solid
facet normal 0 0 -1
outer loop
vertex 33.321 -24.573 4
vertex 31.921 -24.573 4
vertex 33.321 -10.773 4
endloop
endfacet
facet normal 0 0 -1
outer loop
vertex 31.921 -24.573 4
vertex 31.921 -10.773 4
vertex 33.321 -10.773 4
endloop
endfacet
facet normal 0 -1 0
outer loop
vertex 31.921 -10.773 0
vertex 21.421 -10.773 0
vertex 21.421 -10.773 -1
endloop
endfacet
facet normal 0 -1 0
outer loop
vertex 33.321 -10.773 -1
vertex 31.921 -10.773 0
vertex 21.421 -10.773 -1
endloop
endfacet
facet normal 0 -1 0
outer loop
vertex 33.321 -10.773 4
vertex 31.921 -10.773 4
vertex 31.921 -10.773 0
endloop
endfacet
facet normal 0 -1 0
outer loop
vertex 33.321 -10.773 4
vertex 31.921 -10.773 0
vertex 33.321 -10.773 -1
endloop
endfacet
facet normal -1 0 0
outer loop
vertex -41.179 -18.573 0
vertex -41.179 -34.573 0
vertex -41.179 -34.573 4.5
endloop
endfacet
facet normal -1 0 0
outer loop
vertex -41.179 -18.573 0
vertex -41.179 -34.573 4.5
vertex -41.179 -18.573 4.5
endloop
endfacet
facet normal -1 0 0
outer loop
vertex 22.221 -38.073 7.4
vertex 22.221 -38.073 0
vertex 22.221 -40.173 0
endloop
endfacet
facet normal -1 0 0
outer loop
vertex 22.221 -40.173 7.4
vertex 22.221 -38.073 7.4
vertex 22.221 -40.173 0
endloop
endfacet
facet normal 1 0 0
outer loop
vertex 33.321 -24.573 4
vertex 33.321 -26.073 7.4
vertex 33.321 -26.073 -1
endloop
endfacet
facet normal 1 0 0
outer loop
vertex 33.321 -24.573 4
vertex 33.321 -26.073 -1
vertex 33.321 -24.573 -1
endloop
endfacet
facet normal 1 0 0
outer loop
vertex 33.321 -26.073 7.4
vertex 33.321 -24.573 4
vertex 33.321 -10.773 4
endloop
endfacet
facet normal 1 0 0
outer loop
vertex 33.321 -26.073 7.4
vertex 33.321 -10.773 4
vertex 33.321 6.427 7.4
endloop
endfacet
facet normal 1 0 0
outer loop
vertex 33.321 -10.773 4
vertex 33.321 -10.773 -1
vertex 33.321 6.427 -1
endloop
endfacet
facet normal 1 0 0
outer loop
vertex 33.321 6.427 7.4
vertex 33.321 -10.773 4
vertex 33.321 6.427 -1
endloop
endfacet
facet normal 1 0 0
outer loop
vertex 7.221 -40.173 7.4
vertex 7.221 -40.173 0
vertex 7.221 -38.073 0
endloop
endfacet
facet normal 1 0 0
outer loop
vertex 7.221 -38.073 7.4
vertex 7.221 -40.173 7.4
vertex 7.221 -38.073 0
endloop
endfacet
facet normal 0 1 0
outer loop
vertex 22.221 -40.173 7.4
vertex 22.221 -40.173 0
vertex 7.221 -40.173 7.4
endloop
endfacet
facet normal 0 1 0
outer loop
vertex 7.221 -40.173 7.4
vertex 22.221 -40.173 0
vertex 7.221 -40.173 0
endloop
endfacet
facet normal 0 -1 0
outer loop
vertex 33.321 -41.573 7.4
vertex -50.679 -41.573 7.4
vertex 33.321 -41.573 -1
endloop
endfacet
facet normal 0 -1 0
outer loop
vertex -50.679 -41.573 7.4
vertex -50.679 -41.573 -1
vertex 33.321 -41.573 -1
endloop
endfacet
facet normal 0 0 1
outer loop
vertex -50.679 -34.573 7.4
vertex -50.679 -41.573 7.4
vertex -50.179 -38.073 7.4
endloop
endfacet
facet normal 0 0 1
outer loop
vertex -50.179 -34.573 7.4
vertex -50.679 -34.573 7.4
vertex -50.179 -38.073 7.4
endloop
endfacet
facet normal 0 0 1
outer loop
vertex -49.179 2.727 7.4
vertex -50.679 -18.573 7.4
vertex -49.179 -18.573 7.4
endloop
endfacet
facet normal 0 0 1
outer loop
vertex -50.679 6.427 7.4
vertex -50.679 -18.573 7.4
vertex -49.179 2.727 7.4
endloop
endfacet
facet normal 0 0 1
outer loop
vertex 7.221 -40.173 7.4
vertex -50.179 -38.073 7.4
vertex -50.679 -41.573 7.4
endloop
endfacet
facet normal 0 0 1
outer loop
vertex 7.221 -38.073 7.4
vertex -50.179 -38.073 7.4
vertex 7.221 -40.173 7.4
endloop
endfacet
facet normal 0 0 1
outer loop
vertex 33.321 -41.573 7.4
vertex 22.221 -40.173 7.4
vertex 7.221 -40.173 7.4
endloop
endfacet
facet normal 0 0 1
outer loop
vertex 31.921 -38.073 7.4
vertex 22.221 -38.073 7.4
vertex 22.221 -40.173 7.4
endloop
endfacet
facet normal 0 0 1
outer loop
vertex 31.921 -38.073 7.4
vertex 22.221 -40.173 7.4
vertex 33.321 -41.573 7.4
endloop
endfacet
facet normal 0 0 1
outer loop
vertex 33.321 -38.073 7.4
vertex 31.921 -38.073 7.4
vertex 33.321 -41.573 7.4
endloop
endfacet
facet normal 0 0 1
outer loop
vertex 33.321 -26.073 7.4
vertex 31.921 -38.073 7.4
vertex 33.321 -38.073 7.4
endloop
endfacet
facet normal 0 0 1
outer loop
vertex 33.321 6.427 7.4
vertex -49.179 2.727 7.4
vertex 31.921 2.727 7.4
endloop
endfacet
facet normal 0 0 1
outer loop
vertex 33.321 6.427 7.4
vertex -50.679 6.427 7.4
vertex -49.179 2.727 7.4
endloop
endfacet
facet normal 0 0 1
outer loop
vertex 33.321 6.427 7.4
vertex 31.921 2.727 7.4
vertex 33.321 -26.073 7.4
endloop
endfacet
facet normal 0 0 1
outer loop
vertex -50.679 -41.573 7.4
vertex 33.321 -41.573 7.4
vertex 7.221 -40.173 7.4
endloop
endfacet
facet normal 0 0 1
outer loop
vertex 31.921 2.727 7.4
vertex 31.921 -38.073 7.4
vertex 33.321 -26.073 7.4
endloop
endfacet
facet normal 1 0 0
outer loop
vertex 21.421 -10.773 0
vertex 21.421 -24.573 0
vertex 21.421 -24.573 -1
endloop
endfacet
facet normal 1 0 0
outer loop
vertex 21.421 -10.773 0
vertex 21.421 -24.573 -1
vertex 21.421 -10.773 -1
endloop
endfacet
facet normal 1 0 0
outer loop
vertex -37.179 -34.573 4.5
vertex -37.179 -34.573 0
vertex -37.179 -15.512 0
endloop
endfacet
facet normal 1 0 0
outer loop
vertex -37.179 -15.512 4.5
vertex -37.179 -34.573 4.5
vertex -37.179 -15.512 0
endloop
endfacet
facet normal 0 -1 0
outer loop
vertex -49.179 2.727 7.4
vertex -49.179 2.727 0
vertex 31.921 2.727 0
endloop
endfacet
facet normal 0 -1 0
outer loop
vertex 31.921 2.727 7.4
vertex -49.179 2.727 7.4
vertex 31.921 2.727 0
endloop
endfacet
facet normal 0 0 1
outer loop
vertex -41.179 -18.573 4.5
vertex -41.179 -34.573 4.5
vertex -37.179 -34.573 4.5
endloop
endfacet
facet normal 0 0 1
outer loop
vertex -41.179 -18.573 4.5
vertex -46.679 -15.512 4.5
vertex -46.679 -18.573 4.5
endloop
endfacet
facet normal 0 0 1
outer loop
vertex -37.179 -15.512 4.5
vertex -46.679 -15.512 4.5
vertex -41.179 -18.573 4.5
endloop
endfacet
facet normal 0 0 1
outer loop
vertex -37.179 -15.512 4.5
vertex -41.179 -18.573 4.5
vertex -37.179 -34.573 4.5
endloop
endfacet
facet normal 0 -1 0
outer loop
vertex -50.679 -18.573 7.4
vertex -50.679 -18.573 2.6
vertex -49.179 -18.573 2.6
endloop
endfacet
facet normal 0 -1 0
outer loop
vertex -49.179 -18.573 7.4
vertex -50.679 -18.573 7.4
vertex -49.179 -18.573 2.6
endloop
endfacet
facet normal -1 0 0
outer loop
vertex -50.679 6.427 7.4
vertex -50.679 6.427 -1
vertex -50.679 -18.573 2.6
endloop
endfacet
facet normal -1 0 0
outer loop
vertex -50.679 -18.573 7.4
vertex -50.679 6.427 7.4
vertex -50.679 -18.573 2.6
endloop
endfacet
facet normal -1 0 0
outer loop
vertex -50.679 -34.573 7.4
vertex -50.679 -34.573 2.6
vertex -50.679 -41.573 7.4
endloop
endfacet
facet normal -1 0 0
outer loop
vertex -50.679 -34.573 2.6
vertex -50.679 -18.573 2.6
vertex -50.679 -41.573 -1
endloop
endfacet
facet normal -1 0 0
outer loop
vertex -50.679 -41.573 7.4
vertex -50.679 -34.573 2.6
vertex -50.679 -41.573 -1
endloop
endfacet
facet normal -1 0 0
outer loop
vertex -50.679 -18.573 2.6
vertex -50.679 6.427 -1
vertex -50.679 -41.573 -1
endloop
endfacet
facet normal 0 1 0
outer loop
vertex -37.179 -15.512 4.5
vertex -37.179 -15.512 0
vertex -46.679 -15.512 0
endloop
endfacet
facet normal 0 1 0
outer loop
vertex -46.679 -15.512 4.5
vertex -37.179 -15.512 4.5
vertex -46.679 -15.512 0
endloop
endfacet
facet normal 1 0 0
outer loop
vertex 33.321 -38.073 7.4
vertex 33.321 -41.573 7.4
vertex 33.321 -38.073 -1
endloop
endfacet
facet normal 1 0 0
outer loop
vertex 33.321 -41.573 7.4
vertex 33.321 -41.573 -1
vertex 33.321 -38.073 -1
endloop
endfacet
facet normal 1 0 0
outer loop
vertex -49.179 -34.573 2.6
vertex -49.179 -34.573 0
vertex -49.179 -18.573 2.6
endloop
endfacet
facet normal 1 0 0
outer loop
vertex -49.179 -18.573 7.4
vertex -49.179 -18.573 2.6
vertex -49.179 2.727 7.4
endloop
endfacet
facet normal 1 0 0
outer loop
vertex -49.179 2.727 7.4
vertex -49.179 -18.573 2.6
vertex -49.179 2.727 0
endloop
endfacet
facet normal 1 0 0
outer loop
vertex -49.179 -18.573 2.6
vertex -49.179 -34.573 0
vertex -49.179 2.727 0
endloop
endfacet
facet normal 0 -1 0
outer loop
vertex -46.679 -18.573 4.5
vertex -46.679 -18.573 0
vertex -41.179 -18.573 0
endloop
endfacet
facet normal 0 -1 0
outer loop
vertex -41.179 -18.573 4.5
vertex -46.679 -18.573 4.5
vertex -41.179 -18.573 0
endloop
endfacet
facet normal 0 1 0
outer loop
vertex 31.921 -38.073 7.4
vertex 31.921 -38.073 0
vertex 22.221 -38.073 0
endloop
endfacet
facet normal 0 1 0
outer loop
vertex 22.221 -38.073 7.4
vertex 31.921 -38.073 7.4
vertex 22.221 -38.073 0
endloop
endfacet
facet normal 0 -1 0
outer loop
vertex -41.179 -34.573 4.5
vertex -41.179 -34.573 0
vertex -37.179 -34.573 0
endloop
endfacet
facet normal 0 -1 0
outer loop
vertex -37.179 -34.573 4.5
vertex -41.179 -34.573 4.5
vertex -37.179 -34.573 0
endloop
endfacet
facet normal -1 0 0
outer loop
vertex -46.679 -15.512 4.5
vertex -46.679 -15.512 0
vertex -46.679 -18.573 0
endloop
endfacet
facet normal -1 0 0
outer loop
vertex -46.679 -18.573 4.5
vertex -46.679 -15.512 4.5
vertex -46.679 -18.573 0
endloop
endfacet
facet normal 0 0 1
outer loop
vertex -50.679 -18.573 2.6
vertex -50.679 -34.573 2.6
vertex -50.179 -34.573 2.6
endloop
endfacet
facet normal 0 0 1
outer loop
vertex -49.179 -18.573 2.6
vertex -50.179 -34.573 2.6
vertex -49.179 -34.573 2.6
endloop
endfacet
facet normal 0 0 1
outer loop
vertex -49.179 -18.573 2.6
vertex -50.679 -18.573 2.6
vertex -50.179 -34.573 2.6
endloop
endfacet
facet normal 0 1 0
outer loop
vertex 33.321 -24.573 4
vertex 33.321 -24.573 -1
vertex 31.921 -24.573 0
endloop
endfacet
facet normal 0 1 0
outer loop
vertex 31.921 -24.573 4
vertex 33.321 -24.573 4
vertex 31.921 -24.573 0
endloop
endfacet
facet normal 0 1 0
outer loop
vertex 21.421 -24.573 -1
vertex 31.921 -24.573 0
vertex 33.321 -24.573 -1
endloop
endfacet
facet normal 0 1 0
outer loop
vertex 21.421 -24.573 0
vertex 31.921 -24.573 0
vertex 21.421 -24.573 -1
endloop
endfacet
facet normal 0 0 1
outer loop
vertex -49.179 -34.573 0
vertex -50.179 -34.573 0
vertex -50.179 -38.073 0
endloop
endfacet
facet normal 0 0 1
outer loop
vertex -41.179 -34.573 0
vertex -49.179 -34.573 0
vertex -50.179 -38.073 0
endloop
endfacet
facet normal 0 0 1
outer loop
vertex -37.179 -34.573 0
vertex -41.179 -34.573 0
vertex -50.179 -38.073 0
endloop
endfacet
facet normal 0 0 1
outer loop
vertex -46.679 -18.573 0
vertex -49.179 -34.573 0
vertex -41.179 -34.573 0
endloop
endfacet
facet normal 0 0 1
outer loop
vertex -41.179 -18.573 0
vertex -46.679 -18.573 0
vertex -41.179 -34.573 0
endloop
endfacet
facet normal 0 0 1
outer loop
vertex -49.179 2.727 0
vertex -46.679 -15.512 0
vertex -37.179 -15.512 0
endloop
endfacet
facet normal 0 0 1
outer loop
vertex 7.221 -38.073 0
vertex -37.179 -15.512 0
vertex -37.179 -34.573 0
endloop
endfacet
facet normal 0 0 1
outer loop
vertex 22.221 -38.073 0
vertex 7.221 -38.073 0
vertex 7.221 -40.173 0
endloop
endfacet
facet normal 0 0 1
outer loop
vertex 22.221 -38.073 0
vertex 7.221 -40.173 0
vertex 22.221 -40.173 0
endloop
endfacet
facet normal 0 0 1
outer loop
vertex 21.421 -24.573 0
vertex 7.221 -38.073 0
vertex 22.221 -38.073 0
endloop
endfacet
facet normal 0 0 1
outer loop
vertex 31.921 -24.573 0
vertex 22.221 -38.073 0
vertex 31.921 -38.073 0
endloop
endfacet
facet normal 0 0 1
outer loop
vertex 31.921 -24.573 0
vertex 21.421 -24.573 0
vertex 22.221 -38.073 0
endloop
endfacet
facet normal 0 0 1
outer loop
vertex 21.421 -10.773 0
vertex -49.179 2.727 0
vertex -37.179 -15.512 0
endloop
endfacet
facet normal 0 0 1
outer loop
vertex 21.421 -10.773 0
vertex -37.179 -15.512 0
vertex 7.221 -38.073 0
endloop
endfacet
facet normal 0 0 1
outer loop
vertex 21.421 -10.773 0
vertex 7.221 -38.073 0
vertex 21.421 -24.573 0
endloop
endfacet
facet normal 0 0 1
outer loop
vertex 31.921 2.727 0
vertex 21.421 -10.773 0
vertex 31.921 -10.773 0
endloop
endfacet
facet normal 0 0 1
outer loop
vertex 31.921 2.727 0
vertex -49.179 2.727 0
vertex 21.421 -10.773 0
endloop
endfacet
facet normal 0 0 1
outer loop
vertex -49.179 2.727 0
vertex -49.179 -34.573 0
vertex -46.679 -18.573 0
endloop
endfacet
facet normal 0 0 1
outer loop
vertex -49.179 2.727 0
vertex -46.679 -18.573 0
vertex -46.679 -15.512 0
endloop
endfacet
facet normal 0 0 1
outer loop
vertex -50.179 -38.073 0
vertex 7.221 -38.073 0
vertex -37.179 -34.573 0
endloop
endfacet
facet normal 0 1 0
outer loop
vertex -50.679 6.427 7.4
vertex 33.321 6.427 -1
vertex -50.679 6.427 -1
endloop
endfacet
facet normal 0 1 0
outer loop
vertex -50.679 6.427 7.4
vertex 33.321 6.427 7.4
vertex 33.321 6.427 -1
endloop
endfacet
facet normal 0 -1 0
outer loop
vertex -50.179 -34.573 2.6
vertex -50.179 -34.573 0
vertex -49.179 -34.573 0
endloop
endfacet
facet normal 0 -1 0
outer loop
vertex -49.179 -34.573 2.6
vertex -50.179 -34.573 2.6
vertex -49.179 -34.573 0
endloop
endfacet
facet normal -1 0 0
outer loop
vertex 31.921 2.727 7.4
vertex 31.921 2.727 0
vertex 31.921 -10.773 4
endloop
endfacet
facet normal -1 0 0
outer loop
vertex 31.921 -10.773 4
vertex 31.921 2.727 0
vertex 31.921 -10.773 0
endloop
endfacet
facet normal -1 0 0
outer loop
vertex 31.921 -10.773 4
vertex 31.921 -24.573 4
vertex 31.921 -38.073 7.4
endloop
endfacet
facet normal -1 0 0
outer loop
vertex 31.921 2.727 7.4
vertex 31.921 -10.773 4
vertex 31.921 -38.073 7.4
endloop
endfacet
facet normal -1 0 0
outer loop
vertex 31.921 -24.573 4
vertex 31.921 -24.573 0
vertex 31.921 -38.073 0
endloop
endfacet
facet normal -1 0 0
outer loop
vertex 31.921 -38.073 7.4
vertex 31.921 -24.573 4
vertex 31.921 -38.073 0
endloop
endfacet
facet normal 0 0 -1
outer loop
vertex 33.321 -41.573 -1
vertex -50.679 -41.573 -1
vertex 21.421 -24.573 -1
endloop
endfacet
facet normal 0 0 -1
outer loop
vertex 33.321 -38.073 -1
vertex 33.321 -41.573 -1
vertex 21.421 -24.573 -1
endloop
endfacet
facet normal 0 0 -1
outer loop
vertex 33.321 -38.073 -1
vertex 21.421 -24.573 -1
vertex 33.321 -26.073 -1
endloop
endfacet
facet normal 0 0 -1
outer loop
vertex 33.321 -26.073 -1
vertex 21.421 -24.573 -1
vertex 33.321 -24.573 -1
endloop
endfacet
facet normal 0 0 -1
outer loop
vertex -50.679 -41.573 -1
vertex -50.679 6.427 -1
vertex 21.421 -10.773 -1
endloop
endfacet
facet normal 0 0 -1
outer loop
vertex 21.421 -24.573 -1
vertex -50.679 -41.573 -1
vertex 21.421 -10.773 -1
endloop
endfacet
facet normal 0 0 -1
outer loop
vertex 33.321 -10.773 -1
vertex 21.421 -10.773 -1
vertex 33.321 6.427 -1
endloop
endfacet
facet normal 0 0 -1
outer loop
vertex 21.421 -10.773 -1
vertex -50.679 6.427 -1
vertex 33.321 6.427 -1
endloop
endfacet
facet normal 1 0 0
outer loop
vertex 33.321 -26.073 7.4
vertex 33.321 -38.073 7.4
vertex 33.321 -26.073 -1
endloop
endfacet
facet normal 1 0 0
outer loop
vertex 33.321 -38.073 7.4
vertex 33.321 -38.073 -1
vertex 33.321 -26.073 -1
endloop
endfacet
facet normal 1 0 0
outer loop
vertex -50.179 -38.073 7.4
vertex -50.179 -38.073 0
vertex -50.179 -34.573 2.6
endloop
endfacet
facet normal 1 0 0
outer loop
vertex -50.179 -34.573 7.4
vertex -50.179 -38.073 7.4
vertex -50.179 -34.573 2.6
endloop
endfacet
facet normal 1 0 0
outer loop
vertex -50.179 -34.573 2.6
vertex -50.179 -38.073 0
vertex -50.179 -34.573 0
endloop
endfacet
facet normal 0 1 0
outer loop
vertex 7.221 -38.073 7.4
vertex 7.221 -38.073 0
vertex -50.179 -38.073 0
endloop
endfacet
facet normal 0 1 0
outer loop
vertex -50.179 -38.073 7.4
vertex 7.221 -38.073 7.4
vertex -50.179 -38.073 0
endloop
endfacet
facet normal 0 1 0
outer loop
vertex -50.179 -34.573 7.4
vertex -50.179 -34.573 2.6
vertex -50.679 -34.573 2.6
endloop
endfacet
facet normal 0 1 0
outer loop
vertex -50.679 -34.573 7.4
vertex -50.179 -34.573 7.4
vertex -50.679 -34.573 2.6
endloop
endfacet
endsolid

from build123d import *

# Parameters (mm, degrees)
F0_W     = 4
F0_H     = 16
F1_DEPTH = 1
F0_W_2   = 1.4000003636
F0_H_2   = 11.8
F0_H_3   = 2
F2_DEPTH = 7.4
F3_DEPTH = 2.6
F4_DEPTH = 4.5
F5_DEPTH = 4


# Not quite as in the source:
# - ends of sketch curves that miss each other by under 0.0002 mm in the source are joined
# - a feature names something its author has since deleted; it is built from what else it names


with BuildPart() as f1:
    # F0 (on Top) → F1 (new body)
    with BuildSketch(Plane.XY):
        Polygon((-46.6793118417, -34.5732776225), (-46.6793118417, -35.6732776225), (9.7206891477, -35.6732776225), (9.7206891477, -37.6732772589), (19.7206891477, -37.6732772589), (19.7206891477, -35.5732776225), (29.4207941621, -35.5732776225), (29.4207941621, -34.5732776225), (31.9206877947, -34.5732776225), (31.9206877947, -26.0732776225), (29.4206877947, -26.0732776225), (29.4206877947, -24.5732776225), (21.4206877947, -24.5732776225), (21.4206877947, -12.7732776225), (21.4206877947, -10.7732776225), (29.4206877947, -10.7732776225), (29.4206877947, 0.2267237306), (-46.6793118417, 0.2267237306), (-46.6793118417, -15.5122037977), (-37.1793118417, -15.5122037977), (-37.1793118417, -18.5732776225), (-37.1793118417, -34.5732776225), (-41.1793118417, -34.5732776225), (-41.1793118417, -18.5732776225), (-46.6793118417, -18.5732776225), (-49.1793118417, -18.5732776225), (-49.1793118417, -34.5732776225), align=None)
        Polygon((-49.1793118417, 2.7267237306), (-49.1793118417, -18.5732776225), (-46.6793118417, -18.5732776225), (-46.6793118417, -15.5122037977), (-46.6793118417, 0.2267237306), (29.4206877947, 0.2267237306), (29.4206877947, -10.7732776225), (31.9206877947, -10.7732776225), (31.9206877947, 2.7267237306), align=None)
        Polygon((-50.6793118417, -1.5732776225), (-50.6793118417, -18.5732776225), (-49.1793118417, -18.5732776225), (-49.1793118417, 2.7267237306), (31.9206877947, 2.7267237306), (31.9206877947, -10.7732776225), (33.3206881583, -10.7732776225), (33.3206881583, 6.4267223775), (30.3206881583, 6.4267223775), (-50.6793118417, 6.4267223775), align=None)
        Polygon((-46.6793118417, -35.6732776225), (-46.6793118417, -38.0732776225), (7.2206891477, -38.0732776225), (7.2206891477, -40.1732772589), (22.2206891477, -40.1732772589), (22.2206891477, -38.0732776225), (29.4207941621, -38.0732776225), (31.9206877947, -38.0732776225), (31.9206877947, -34.5732776225), (29.4207941621, -34.5732776225), (29.4207941621, -35.5732776225), (19.7206891477, -35.5732776225), (19.7206891477, -37.6732772589), (9.7206891477, -37.6732772589), (9.7206891477, -35.6732776225), align=None)
        Polygon((-50.6793118417, -38.0732776225), (-50.6793118417, -41.5732776225), (30.3206881583, -41.5732776225), (33.3206881583, -41.5732776225), (33.3206349746, -38.0732776225), (31.9206877947, -38.0732776225), (29.4207941621, -38.0732776225), (22.2206891477, -38.0732776225), (22.2206891477, -40.1732772589), (7.2206891477, -40.1732772589), (7.2206891477, -38.0732776225), (-46.6793118417, -38.0732776225), (-50.1793118417, -38.0732776225), align=None)
        Polygon((31.9206877947, -26.0732776225), (33.3206881583, -26.0732776225), (33.3206881583, -24.5732776225), (31.9206877947, -24.5732776225), (31.9206877947, -25.7732776225), align=None)
        Polygon((33.3205817909, -34.5732776225), (33.3206349746, -38.0732776225), (33.3206881583, -26.0732776225), (31.9206877947, -26.0732776225), (31.9206877947, -34.5732776225), align=None)
        Polygon((31.9206877947, -38.0732776225), (33.3206349746, -38.0732776225), (33.3205817909, -34.5732776225), (31.9206877947, -34.5732776225), align=None)
        Polygon((-50.6793118417, -18.5732776225), (-50.6793118417, -34.5732776225), (-50.1793118417, -34.5732776225), (-49.1793118417, -34.5732776225), (-49.1793118417, -18.5732776225), align=None)
        Polygon((-50.1793118417, -34.5732776225), (-50.1793118417, -38.0732776225), (-46.6793118417, -38.0732776225), (-46.6793118417, -35.6732776225), (-46.6793118417, -34.5732776225), (-49.1793118417, -34.5732776225), align=None)
        Polygon((-50.6793118417, -35.5732776225), (-50.6793118417, -38.0732776225), (-50.1793118417, -38.0732776225), (-50.1793118417, -34.5732776225), (-50.6793118417, -34.5732776225), align=None)
        with Locations((-39.1793118417, -26.5732776225)):
            Rectangle(F0_W, F0_H)
        Polygon((-46.6793118417, -15.5122037977), (-46.6793118417, -18.5732776225), (-41.1793118417, -18.5732776225), (-37.1793118417, -18.5732776225), (-37.1793118417, -15.5122037977), align=None)
        Polygon((29.4206877947, -26.0732776225), (31.9206877947, -26.0732776225), (31.9206877947, -25.7732776225), (31.9206877947, -24.5732776225), (29.4206877947, -24.5732776225), align=None)
    extrude(amount=-F1_DEPTH)

    # F0 (on Top) → F2 (join)
    with BuildSketch(Plane.XY):
        Polygon((-50.6793118417, -38.0732776225), (-50.6793118417, -41.5732776225), (30.3206881583, -41.5732776225), (33.3206881583, -41.5732776225), (33.3206349746, -38.0732776225), (31.9206877947, -38.0732776225), (29.4207941621, -38.0732776225), (22.2206891477, -38.0732776225), (22.2206891477, -40.1732772589), (7.2206891477, -40.1732772589), (7.2206891477, -38.0732776225), (-46.6793118417, -38.0732776225), (-50.1793118417, -38.0732776225), align=None)
        Polygon((-50.6793118417, -1.5732776225), (-50.6793118417, -18.5732776225), (-49.1793118417, -18.5732776225), (-49.1793118417, 2.7267237306), (31.9206877947, 2.7267237306), (31.9206877947, -10.7732776225), (33.3206881583, -10.7732776225), (33.3206881583, 6.4267223775), (30.3206881583, 6.4267223775), (-50.6793118417, 6.4267223775), align=None)
        Polygon((31.9206877947, -26.0732776225), (33.3206881583, -26.0732776225), (33.3206881583, -24.5732776225), (31.9206877947, -24.5732776225), (31.9206877947, -25.7732776225), align=None)
        Polygon((33.3205817909, -34.5732776225), (33.3206349746, -38.0732776225), (33.3206881583, -26.0732776225), (31.9206877947, -26.0732776225), (31.9206877947, -34.5732776225), align=None)
        Polygon((31.9206877947, -38.0732776225), (33.3206349746, -38.0732776225), (33.3205817909, -34.5732776225), (31.9206877947, -34.5732776225), align=None)
        Polygon((-50.6793118417, -35.5732776225), (-50.6793118417, -38.0732776225), (-50.1793118417, -38.0732776225), (-50.1793118417, -34.5732776225), (-50.6793118417, -34.5732776225), align=None)
        with Locations((32.6206879765, -18.6732776225)):
            Rectangle(F0_W_2, F0_H_2)
        with Locations((32.6206879765, -11.7732776225)):
            Rectangle(F0_W_2, F0_H_3)
    extrude(amount=F2_DEPTH)

    # F0 (on Top) → F3 (join)
    with BuildSketch(Plane.XY):
        Polygon((-50.6793118417, -18.5732776225), (-50.6793118417, -34.5732776225), (-50.1793118417, -34.5732776225), (-49.1793118417, -34.5732776225), (-49.1793118417, -18.5732776225), align=None)
    extrude(amount=F3_DEPTH)

    # F0 (on Top) → F4 (join)
    with BuildSketch(Plane.XY):
        with Locations((-39.1793118417, -26.5732776225)):
            Rectangle(F0_W, F0_H)
        Polygon((-46.6793118417, -15.5122037977), (-46.6793118417, -18.5732776225), (-41.1793118417, -18.5732776225), (-37.1793118417, -18.5732776225), (-37.1793118417, -15.5122037977), align=None)
    extrude(amount=F4_DEPTH)

    # F0 (on Top) → F5 (cut)
    with BuildSketch(Plane.XY):
        with Locations((32.6206879765, -18.6732776225)):
            Rectangle(F0_W_2, F0_H_2)
        with Locations((32.6206879765, -11.7732776225)):
            Rectangle(F0_W_2, F0_H_3)
    extrude(amount=F5_DEPTH, mode=Mode.SUBTRACT)


solid = f1.part
